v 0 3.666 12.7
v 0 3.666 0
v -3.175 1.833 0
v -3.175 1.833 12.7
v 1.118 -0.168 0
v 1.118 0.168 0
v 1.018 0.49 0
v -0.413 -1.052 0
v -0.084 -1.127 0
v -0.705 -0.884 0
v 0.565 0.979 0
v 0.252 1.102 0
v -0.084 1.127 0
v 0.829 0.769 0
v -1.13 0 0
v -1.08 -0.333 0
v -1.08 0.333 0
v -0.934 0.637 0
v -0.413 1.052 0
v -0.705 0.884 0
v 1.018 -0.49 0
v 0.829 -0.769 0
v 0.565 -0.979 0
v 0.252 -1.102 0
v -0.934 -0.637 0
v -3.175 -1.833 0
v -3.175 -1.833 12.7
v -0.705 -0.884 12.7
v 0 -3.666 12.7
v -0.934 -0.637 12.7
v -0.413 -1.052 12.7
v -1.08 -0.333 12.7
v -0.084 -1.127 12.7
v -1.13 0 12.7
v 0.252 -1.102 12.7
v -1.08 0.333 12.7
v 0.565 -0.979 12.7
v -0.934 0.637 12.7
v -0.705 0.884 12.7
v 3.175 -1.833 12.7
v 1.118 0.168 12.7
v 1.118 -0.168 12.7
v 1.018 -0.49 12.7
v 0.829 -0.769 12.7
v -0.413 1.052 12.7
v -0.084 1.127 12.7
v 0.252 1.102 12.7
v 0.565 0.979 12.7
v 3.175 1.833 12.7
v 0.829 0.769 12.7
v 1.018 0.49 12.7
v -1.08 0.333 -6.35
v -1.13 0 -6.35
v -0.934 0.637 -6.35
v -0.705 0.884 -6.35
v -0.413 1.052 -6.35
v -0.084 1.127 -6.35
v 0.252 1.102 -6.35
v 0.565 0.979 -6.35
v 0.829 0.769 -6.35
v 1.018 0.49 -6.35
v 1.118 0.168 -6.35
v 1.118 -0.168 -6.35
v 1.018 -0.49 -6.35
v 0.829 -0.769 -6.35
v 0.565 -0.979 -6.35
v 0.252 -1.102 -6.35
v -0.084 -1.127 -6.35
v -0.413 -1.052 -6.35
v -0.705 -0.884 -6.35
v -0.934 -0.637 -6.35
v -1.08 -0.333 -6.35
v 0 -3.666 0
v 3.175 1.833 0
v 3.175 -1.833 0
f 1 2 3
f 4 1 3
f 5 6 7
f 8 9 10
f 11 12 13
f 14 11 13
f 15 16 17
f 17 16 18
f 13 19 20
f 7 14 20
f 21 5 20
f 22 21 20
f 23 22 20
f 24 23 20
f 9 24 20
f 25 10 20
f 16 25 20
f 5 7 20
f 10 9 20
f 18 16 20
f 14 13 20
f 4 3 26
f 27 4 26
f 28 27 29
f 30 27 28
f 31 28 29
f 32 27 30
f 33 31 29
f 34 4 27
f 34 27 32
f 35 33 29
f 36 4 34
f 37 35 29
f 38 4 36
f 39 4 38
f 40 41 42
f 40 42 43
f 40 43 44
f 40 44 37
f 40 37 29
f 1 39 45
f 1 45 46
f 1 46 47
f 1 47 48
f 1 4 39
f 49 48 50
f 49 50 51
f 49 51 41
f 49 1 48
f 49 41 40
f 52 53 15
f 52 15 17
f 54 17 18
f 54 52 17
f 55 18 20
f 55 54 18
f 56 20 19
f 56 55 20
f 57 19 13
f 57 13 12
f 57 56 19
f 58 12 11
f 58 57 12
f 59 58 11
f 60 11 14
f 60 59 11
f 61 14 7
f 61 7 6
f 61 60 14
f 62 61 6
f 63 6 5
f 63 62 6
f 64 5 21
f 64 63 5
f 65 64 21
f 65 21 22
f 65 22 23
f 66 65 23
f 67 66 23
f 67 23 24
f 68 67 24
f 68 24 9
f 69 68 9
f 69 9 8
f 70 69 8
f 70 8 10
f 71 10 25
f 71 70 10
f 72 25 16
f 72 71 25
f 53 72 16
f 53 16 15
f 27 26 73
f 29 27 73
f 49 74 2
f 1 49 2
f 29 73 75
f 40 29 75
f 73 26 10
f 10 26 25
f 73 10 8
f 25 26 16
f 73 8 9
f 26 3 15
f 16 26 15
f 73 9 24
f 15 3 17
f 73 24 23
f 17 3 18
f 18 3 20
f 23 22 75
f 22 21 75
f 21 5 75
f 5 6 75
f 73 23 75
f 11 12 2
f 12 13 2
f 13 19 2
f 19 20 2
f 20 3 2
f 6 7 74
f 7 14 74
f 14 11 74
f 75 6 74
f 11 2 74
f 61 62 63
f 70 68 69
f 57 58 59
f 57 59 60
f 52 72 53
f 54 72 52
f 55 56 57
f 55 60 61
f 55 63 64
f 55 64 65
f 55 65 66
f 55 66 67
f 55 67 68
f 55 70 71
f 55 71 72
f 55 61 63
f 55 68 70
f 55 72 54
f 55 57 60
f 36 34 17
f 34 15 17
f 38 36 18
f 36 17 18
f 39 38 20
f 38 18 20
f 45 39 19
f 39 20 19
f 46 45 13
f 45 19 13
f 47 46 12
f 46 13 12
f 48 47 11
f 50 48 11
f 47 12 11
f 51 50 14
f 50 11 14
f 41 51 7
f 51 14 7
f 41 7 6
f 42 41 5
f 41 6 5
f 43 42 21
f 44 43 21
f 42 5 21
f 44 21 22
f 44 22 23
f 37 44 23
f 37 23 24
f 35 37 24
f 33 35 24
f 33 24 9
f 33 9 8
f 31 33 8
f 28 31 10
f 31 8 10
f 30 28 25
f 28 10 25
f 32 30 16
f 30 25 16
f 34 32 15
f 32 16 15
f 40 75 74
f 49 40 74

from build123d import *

# Parameters (mm, degrees)
BOSS_EXTRUDE1_DEPTH           = 12.7
TAP_DRILL_FOR_4_40_TAP1_D     = 2.2606
TAP_DRILL_FOR_4_40_TAP1_DEPTH = 12.7
TAP_DRILL_FOR_4_40_TAP1_TIP   = 0.679152758
BOSS_EXTRUDE2_START           = 6.35
SKETCH5_R                     = 1.1303
BOSS_EXTRUDE2_DEPTH           = 6.35


with BuildPart() as part:
    # Sketch1 → Boss-Extrude1 (new body)
    with BuildSketch(Plane.XY):
        Polygon((0, 3.666174209), (-3.175, 1.833087105), (-3.175, -1.833087105), (0, -3.666174209), (3.175, -1.833087105), (3.175, 1.833087105), align=None)
    extrude(amount=BOSS_EXTRUDE1_DEPTH)

    # Tap Drill for #4-40 Tap1
    with Locations(Plane.XY.offset(12.7)):
        with Locations((0, 0)):
            Hole(TAP_DRILL_FOR_4_40_TAP1_D / 2, depth=TAP_DRILL_FOR_4_40_TAP1_DEPTH)
            with Locations((0, 0, -(TAP_DRILL_FOR_4_40_TAP1_DEPTH + TAP_DRILL_FOR_4_40_TAP1_TIP / 2))):  # 118° drill point
                Cone(0, TAP_DRILL_FOR_4_40_TAP1_D / 2, TAP_DRILL_FOR_4_40_TAP1_TIP, mode=Mode.SUBTRACT)


with BuildPart() as body_2:
    # Sketch5 → Boss-Extrude2 (new body)
    with BuildSketch(Plane(origin=(0, 0, 0), x_dir=(-1, 0, 0), z_dir=(0, 0, -1)).offset(BOSS_EXTRUDE2_START)):
        Circle(SKETCH5_R)
    extrude(amount=-BOSS_EXTRUDE2_DEPTH)


solid = Compound([part.part, body_2.part])
